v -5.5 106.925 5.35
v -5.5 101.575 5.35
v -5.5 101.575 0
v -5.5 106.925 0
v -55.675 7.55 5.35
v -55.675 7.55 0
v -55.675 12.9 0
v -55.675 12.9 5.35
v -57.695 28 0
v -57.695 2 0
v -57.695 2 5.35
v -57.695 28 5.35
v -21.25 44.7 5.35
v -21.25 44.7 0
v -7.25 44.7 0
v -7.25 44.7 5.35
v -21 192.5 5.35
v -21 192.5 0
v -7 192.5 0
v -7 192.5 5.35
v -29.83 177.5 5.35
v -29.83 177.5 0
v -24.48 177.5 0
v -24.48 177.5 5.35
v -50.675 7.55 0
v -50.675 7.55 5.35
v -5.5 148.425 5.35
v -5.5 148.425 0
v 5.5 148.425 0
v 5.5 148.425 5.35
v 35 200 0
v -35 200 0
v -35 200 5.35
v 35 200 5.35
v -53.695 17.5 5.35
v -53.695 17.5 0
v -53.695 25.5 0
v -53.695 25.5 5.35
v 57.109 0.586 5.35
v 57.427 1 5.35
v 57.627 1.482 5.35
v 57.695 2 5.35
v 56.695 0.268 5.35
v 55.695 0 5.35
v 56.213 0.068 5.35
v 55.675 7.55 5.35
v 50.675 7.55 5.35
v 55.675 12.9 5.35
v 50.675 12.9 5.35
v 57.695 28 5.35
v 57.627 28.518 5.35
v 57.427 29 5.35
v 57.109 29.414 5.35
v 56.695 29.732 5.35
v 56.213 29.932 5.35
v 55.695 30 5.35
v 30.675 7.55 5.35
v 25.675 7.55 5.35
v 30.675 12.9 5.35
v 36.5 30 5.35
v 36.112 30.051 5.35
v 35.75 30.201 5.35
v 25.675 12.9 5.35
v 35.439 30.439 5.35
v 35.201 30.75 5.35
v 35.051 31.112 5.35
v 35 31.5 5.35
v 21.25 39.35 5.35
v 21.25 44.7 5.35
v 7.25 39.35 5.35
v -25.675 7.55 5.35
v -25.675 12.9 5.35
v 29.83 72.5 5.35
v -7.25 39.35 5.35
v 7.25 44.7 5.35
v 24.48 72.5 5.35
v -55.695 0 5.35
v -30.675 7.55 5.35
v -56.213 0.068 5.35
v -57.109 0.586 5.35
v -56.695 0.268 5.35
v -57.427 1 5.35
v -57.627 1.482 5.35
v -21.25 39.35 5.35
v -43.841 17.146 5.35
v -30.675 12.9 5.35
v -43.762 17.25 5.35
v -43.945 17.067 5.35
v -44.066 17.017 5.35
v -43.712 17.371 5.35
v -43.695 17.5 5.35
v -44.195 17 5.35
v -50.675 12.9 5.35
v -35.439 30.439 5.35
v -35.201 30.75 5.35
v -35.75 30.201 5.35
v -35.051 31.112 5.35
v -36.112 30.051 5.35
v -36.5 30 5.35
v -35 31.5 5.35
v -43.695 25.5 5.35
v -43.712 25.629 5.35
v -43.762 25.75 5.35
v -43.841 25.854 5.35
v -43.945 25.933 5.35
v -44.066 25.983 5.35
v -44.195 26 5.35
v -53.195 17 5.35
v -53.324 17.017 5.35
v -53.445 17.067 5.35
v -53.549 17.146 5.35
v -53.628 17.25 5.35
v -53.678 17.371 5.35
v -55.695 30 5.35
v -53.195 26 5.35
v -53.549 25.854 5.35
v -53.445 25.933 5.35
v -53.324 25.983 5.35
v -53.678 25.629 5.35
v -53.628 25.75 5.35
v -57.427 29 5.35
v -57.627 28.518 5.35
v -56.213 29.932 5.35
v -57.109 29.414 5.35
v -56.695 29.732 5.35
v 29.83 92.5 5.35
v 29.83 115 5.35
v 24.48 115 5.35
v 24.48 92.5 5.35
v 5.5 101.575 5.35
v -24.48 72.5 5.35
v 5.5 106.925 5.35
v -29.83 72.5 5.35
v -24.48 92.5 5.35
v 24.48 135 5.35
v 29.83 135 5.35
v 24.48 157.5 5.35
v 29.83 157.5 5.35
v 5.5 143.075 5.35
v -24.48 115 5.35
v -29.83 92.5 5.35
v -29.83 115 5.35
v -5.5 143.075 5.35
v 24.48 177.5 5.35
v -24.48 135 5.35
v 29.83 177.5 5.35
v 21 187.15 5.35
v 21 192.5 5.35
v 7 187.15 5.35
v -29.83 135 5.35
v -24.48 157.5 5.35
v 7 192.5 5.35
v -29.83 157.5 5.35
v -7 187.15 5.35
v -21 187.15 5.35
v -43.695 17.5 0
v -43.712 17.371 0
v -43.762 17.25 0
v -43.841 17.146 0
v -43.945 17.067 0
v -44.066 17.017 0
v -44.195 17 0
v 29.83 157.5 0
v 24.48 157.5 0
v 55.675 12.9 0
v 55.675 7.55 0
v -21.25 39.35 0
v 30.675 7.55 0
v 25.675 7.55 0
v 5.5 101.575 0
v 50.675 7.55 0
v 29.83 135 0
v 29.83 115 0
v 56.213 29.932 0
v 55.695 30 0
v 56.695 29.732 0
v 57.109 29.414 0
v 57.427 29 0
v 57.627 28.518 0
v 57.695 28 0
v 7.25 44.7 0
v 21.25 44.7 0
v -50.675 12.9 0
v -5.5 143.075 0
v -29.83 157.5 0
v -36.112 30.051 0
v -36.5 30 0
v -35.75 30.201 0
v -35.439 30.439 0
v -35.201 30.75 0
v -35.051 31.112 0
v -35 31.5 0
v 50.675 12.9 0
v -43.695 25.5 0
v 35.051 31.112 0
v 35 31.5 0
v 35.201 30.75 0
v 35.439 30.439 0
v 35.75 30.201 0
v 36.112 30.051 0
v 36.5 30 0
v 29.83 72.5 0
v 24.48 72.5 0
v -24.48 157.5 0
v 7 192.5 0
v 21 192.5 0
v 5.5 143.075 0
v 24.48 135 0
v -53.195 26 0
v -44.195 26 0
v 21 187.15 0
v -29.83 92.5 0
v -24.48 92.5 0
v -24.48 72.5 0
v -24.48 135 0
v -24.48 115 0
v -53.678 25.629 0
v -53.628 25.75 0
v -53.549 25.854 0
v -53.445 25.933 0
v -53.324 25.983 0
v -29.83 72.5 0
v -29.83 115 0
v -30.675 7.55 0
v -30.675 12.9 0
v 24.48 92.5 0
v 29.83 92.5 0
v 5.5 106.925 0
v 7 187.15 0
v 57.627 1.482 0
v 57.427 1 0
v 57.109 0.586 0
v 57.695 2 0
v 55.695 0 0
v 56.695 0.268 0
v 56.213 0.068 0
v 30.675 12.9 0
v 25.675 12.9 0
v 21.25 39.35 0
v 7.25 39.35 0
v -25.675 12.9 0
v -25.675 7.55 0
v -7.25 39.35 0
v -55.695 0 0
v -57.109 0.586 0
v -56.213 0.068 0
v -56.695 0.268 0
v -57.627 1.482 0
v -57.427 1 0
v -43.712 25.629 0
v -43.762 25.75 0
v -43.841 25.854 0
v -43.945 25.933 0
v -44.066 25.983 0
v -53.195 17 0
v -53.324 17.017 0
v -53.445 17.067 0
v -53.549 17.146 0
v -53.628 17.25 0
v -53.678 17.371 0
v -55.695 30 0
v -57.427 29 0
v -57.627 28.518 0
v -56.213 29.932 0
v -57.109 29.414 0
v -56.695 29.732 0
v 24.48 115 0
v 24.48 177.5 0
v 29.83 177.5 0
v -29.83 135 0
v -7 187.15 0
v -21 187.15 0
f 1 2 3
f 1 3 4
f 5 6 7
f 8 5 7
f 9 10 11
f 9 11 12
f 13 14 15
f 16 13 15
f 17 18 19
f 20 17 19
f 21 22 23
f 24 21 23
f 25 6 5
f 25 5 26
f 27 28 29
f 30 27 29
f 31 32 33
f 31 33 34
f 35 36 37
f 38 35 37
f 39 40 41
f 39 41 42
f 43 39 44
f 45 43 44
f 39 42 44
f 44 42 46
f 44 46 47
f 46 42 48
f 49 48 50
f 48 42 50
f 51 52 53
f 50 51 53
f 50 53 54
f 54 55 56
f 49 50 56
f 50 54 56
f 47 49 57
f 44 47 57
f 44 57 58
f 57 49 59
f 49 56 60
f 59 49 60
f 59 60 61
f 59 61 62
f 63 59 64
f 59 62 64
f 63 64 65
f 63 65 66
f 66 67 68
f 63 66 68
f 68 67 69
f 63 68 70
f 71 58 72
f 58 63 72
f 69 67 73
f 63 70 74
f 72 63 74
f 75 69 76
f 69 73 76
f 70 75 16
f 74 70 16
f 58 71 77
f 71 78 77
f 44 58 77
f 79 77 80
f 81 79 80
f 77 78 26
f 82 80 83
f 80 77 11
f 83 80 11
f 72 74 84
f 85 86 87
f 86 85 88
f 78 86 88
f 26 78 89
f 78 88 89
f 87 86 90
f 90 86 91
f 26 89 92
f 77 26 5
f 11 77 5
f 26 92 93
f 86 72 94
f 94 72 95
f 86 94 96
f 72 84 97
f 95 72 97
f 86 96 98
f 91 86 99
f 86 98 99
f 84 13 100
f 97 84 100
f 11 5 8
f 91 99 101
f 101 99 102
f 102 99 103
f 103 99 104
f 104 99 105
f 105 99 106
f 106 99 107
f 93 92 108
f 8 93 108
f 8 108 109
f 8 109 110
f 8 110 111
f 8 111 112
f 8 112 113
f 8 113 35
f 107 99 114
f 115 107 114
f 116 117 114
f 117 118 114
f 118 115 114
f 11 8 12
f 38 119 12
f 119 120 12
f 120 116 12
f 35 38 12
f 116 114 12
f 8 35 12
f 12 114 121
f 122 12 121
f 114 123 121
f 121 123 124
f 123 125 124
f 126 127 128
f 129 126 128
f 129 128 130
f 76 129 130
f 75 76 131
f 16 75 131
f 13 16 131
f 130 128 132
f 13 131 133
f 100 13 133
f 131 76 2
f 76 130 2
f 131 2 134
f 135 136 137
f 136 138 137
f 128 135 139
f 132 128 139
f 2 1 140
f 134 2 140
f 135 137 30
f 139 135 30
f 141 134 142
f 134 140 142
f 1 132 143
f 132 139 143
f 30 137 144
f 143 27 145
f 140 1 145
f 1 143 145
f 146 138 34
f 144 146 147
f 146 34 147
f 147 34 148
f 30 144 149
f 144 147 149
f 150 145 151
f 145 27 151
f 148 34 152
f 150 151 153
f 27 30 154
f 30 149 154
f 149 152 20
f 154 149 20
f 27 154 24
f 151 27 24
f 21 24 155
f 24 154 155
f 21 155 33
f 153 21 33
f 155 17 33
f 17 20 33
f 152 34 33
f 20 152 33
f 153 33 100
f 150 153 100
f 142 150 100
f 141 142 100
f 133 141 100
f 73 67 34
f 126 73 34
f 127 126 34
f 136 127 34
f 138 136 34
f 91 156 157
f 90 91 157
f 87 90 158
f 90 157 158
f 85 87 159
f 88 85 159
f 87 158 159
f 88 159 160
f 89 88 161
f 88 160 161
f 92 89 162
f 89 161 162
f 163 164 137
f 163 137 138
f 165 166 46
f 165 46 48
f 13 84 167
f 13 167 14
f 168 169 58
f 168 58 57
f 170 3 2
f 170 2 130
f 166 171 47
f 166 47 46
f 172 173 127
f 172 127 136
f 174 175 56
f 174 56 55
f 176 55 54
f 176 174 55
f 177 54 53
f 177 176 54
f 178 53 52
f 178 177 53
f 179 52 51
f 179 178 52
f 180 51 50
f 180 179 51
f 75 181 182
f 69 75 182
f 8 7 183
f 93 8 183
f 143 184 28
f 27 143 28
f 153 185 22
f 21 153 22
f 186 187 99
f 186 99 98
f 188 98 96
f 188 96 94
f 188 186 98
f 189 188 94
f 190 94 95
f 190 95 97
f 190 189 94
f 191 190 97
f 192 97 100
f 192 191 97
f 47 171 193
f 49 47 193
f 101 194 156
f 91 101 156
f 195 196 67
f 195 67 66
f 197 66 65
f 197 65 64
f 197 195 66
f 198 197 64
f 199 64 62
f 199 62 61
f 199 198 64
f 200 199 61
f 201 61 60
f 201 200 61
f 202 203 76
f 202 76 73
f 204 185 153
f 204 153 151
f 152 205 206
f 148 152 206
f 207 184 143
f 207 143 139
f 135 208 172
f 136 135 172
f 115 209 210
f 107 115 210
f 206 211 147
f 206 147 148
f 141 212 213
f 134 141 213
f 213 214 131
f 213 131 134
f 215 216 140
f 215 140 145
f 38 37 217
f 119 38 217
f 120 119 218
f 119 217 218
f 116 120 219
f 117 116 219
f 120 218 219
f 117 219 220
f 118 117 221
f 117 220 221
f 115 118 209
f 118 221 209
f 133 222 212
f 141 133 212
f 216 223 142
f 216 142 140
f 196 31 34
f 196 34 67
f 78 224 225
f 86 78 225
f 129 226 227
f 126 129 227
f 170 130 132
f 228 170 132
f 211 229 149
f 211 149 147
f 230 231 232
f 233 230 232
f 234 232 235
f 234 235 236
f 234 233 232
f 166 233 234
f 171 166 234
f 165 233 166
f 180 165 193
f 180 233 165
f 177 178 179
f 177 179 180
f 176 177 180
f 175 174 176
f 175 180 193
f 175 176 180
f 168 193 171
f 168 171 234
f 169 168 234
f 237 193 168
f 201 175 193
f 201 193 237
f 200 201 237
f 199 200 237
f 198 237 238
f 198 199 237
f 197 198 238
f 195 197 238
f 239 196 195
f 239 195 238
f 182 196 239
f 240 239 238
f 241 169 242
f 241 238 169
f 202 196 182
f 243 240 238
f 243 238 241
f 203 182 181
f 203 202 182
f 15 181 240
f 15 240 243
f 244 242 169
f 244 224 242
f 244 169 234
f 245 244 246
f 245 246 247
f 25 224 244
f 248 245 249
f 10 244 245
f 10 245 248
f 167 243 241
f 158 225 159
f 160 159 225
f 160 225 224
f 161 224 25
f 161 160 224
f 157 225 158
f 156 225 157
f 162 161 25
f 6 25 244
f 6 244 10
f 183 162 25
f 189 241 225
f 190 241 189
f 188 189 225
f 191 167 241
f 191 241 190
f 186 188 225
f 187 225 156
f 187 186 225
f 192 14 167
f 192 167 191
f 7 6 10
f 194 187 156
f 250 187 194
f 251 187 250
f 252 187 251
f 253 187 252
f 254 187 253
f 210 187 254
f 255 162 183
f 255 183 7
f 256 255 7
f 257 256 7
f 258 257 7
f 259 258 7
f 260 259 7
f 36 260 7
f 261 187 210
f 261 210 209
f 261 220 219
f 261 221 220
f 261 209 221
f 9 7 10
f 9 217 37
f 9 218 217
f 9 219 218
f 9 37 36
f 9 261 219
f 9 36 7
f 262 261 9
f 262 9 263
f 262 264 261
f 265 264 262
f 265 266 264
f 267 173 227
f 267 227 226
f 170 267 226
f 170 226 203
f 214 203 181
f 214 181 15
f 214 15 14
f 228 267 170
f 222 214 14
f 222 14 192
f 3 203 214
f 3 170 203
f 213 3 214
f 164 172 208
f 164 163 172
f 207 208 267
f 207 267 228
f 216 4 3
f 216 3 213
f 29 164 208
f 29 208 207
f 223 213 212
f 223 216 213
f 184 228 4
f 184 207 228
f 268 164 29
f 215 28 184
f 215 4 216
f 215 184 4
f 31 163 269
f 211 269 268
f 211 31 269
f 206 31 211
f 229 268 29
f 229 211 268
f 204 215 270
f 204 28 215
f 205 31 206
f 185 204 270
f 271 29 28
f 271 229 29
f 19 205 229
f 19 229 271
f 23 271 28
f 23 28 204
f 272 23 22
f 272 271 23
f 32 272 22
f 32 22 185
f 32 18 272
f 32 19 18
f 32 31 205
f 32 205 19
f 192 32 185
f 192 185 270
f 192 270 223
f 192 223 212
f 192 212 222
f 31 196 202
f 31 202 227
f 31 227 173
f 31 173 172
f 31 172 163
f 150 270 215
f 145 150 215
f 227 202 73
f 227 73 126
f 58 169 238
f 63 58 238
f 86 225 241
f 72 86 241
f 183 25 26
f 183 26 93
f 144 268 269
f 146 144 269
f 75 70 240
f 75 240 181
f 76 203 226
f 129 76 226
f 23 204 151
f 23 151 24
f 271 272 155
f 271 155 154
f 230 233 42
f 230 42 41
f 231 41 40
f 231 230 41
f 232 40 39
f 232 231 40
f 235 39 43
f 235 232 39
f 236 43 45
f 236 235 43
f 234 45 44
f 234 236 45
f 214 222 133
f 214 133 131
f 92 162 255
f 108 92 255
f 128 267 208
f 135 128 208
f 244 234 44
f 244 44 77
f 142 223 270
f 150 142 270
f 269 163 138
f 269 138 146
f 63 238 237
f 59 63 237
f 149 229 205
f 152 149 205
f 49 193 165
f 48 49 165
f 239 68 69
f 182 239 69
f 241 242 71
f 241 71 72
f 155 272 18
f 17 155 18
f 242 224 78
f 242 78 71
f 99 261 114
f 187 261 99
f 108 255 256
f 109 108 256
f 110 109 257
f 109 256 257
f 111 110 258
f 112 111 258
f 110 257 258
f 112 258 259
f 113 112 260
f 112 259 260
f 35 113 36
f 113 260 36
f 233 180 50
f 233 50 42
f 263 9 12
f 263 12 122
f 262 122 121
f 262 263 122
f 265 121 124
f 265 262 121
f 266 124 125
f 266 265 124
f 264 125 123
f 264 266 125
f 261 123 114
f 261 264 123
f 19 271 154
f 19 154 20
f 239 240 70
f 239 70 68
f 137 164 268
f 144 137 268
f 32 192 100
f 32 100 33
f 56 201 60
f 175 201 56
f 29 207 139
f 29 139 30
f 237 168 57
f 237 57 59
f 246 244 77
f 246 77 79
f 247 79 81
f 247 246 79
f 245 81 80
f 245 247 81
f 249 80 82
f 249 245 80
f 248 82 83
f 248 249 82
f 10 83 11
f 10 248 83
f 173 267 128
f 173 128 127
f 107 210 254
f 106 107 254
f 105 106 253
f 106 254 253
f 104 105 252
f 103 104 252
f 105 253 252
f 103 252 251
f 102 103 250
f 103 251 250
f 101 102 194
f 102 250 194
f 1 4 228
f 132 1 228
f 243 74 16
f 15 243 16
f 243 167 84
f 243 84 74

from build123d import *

# Parameters (mm, degrees)
MODEL_W             = 5
MODEL_H             = 5.35
MODEL_W_2           = 14
MODEL_W_3           = 11
MODEL_W_4           = 5.35
MODEL_H_2           = 20
BOSS_EXTRUDE1_DEPTH = 5.35


with BuildPart() as part:
    # Model → Boss-Extrude1 (new body)
    with BuildSketch(Plane.XY):
        with BuildLine():
            Line((-55.695, 30), (-36.5, 30))
            ThreePointArc((-36.5, 30), (-35.439339828, 30.439339828), (-35, 31.5))
            Line((-35, 31.5), (-35, 200))
            Line((-35, 200), (35, 200))
            Line((35, 200), (35, 31.5))
            ThreePointArc((35, 31.5), (35.439339828, 30.439339828), (36.5, 30))
            Line((36.5, 30), (55.695, 30))
            ThreePointArc((55.695, 30), (57.109213562, 29.414213562), (57.695, 28))
            Line((57.695, 28), (57.695, 2))
            ThreePointArc((57.695, 2), (57.109213562, 0.585786438), (55.695, 0))
            Line((55.695, 0), (-55.695, 0))
            ThreePointArc((-55.695, 0), (-57.109213562, 0.585786438), (-57.695, 2))
            Line((-57.695, 2), (-57.695, 28))
            ThreePointArc((-57.695, 28), (-57.109213562, 29.414213562), (-55.695, 30))
        make_face()
        with Locations((53.175, 10.225)):
            Rectangle(MODEL_W, MODEL_H, mode=Mode.SUBTRACT)
        with Locations((-53.175, 10.225)):
            Rectangle(MODEL_W, MODEL_H, mode=Mode.SUBTRACT)
        with Locations((14.25, 42.025)):
            Rectangle(MODEL_W_2, MODEL_H, mode=Mode.SUBTRACT)
        with Locations((0, 145.75)):
            Rectangle(MODEL_W_3, MODEL_H, mode=Mode.SUBTRACT)
        with Locations((0, 104.25)):
            Rectangle(MODEL_W_3, MODEL_H, mode=Mode.SUBTRACT)
        with Locations((-14, 189.825)):
            Rectangle(MODEL_W_2, MODEL_H, mode=Mode.SUBTRACT)
        with Locations((-27.155, 167.5)):
            Rectangle(MODEL_W_4, MODEL_H_2, mode=Mode.SUBTRACT)
        with Locations((-27.155, 125)):
            Rectangle(MODEL_W_4, MODEL_H_2, mode=Mode.SUBTRACT)
        with Locations((-27.155, 82.5)):
            Rectangle(MODEL_W_4, MODEL_H_2, mode=Mode.SUBTRACT)
        with Locations((-14.25, 42.025)):
            Rectangle(MODEL_W_2, MODEL_H, mode=Mode.SUBTRACT)
        with Locations((27.155, 82.5)):
            Rectangle(MODEL_W_4, MODEL_H_2, mode=Mode.SUBTRACT)
        with Locations((27.155, 125)):
            Rectangle(MODEL_W_4, MODEL_H_2, mode=Mode.SUBTRACT)
        with Locations((27.155, 167.5)):
            Rectangle(MODEL_W_4, MODEL_H_2, mode=Mode.SUBTRACT)
        with Locations((14, 189.825)):
            Rectangle(MODEL_W_2, MODEL_H, mode=Mode.SUBTRACT)
        with Locations((-28.175, 10.225)):
            Rectangle(MODEL_W, MODEL_H, mode=Mode.SUBTRACT)
        with BuildLine():
            Line((-53.195, 26), (-44.195, 26))
            ThreePointArc((-44.195, 26), (-43.841446609, 25.853553391), (-43.695, 25.5))
            Line((-43.695, 25.5), (-43.695, 17.5))
            ThreePointArc((-43.695, 17.5), (-43.841446609, 17.146446609), (-44.195, 17))
            Line((-44.195, 17), (-53.195, 17))
            ThreePointArc((-53.195, 17), (-53.548553391, 17.146446609), (-53.695, 17.5))
            Line((-53.695, 17.5), (-53.695, 25.5))
            ThreePointArc((-53.695, 25.5), (-53.548553391, 25.853553391), (-53.195, 26))
        make_face(mode=Mode.SUBTRACT)
        with Locations((28.175, 10.225)):
            Rectangle(MODEL_W, MODEL_H, mode=Mode.SUBTRACT)
    extrude(amount=BOSS_EXTRUDE1_DEPTH)


solid = part.part
